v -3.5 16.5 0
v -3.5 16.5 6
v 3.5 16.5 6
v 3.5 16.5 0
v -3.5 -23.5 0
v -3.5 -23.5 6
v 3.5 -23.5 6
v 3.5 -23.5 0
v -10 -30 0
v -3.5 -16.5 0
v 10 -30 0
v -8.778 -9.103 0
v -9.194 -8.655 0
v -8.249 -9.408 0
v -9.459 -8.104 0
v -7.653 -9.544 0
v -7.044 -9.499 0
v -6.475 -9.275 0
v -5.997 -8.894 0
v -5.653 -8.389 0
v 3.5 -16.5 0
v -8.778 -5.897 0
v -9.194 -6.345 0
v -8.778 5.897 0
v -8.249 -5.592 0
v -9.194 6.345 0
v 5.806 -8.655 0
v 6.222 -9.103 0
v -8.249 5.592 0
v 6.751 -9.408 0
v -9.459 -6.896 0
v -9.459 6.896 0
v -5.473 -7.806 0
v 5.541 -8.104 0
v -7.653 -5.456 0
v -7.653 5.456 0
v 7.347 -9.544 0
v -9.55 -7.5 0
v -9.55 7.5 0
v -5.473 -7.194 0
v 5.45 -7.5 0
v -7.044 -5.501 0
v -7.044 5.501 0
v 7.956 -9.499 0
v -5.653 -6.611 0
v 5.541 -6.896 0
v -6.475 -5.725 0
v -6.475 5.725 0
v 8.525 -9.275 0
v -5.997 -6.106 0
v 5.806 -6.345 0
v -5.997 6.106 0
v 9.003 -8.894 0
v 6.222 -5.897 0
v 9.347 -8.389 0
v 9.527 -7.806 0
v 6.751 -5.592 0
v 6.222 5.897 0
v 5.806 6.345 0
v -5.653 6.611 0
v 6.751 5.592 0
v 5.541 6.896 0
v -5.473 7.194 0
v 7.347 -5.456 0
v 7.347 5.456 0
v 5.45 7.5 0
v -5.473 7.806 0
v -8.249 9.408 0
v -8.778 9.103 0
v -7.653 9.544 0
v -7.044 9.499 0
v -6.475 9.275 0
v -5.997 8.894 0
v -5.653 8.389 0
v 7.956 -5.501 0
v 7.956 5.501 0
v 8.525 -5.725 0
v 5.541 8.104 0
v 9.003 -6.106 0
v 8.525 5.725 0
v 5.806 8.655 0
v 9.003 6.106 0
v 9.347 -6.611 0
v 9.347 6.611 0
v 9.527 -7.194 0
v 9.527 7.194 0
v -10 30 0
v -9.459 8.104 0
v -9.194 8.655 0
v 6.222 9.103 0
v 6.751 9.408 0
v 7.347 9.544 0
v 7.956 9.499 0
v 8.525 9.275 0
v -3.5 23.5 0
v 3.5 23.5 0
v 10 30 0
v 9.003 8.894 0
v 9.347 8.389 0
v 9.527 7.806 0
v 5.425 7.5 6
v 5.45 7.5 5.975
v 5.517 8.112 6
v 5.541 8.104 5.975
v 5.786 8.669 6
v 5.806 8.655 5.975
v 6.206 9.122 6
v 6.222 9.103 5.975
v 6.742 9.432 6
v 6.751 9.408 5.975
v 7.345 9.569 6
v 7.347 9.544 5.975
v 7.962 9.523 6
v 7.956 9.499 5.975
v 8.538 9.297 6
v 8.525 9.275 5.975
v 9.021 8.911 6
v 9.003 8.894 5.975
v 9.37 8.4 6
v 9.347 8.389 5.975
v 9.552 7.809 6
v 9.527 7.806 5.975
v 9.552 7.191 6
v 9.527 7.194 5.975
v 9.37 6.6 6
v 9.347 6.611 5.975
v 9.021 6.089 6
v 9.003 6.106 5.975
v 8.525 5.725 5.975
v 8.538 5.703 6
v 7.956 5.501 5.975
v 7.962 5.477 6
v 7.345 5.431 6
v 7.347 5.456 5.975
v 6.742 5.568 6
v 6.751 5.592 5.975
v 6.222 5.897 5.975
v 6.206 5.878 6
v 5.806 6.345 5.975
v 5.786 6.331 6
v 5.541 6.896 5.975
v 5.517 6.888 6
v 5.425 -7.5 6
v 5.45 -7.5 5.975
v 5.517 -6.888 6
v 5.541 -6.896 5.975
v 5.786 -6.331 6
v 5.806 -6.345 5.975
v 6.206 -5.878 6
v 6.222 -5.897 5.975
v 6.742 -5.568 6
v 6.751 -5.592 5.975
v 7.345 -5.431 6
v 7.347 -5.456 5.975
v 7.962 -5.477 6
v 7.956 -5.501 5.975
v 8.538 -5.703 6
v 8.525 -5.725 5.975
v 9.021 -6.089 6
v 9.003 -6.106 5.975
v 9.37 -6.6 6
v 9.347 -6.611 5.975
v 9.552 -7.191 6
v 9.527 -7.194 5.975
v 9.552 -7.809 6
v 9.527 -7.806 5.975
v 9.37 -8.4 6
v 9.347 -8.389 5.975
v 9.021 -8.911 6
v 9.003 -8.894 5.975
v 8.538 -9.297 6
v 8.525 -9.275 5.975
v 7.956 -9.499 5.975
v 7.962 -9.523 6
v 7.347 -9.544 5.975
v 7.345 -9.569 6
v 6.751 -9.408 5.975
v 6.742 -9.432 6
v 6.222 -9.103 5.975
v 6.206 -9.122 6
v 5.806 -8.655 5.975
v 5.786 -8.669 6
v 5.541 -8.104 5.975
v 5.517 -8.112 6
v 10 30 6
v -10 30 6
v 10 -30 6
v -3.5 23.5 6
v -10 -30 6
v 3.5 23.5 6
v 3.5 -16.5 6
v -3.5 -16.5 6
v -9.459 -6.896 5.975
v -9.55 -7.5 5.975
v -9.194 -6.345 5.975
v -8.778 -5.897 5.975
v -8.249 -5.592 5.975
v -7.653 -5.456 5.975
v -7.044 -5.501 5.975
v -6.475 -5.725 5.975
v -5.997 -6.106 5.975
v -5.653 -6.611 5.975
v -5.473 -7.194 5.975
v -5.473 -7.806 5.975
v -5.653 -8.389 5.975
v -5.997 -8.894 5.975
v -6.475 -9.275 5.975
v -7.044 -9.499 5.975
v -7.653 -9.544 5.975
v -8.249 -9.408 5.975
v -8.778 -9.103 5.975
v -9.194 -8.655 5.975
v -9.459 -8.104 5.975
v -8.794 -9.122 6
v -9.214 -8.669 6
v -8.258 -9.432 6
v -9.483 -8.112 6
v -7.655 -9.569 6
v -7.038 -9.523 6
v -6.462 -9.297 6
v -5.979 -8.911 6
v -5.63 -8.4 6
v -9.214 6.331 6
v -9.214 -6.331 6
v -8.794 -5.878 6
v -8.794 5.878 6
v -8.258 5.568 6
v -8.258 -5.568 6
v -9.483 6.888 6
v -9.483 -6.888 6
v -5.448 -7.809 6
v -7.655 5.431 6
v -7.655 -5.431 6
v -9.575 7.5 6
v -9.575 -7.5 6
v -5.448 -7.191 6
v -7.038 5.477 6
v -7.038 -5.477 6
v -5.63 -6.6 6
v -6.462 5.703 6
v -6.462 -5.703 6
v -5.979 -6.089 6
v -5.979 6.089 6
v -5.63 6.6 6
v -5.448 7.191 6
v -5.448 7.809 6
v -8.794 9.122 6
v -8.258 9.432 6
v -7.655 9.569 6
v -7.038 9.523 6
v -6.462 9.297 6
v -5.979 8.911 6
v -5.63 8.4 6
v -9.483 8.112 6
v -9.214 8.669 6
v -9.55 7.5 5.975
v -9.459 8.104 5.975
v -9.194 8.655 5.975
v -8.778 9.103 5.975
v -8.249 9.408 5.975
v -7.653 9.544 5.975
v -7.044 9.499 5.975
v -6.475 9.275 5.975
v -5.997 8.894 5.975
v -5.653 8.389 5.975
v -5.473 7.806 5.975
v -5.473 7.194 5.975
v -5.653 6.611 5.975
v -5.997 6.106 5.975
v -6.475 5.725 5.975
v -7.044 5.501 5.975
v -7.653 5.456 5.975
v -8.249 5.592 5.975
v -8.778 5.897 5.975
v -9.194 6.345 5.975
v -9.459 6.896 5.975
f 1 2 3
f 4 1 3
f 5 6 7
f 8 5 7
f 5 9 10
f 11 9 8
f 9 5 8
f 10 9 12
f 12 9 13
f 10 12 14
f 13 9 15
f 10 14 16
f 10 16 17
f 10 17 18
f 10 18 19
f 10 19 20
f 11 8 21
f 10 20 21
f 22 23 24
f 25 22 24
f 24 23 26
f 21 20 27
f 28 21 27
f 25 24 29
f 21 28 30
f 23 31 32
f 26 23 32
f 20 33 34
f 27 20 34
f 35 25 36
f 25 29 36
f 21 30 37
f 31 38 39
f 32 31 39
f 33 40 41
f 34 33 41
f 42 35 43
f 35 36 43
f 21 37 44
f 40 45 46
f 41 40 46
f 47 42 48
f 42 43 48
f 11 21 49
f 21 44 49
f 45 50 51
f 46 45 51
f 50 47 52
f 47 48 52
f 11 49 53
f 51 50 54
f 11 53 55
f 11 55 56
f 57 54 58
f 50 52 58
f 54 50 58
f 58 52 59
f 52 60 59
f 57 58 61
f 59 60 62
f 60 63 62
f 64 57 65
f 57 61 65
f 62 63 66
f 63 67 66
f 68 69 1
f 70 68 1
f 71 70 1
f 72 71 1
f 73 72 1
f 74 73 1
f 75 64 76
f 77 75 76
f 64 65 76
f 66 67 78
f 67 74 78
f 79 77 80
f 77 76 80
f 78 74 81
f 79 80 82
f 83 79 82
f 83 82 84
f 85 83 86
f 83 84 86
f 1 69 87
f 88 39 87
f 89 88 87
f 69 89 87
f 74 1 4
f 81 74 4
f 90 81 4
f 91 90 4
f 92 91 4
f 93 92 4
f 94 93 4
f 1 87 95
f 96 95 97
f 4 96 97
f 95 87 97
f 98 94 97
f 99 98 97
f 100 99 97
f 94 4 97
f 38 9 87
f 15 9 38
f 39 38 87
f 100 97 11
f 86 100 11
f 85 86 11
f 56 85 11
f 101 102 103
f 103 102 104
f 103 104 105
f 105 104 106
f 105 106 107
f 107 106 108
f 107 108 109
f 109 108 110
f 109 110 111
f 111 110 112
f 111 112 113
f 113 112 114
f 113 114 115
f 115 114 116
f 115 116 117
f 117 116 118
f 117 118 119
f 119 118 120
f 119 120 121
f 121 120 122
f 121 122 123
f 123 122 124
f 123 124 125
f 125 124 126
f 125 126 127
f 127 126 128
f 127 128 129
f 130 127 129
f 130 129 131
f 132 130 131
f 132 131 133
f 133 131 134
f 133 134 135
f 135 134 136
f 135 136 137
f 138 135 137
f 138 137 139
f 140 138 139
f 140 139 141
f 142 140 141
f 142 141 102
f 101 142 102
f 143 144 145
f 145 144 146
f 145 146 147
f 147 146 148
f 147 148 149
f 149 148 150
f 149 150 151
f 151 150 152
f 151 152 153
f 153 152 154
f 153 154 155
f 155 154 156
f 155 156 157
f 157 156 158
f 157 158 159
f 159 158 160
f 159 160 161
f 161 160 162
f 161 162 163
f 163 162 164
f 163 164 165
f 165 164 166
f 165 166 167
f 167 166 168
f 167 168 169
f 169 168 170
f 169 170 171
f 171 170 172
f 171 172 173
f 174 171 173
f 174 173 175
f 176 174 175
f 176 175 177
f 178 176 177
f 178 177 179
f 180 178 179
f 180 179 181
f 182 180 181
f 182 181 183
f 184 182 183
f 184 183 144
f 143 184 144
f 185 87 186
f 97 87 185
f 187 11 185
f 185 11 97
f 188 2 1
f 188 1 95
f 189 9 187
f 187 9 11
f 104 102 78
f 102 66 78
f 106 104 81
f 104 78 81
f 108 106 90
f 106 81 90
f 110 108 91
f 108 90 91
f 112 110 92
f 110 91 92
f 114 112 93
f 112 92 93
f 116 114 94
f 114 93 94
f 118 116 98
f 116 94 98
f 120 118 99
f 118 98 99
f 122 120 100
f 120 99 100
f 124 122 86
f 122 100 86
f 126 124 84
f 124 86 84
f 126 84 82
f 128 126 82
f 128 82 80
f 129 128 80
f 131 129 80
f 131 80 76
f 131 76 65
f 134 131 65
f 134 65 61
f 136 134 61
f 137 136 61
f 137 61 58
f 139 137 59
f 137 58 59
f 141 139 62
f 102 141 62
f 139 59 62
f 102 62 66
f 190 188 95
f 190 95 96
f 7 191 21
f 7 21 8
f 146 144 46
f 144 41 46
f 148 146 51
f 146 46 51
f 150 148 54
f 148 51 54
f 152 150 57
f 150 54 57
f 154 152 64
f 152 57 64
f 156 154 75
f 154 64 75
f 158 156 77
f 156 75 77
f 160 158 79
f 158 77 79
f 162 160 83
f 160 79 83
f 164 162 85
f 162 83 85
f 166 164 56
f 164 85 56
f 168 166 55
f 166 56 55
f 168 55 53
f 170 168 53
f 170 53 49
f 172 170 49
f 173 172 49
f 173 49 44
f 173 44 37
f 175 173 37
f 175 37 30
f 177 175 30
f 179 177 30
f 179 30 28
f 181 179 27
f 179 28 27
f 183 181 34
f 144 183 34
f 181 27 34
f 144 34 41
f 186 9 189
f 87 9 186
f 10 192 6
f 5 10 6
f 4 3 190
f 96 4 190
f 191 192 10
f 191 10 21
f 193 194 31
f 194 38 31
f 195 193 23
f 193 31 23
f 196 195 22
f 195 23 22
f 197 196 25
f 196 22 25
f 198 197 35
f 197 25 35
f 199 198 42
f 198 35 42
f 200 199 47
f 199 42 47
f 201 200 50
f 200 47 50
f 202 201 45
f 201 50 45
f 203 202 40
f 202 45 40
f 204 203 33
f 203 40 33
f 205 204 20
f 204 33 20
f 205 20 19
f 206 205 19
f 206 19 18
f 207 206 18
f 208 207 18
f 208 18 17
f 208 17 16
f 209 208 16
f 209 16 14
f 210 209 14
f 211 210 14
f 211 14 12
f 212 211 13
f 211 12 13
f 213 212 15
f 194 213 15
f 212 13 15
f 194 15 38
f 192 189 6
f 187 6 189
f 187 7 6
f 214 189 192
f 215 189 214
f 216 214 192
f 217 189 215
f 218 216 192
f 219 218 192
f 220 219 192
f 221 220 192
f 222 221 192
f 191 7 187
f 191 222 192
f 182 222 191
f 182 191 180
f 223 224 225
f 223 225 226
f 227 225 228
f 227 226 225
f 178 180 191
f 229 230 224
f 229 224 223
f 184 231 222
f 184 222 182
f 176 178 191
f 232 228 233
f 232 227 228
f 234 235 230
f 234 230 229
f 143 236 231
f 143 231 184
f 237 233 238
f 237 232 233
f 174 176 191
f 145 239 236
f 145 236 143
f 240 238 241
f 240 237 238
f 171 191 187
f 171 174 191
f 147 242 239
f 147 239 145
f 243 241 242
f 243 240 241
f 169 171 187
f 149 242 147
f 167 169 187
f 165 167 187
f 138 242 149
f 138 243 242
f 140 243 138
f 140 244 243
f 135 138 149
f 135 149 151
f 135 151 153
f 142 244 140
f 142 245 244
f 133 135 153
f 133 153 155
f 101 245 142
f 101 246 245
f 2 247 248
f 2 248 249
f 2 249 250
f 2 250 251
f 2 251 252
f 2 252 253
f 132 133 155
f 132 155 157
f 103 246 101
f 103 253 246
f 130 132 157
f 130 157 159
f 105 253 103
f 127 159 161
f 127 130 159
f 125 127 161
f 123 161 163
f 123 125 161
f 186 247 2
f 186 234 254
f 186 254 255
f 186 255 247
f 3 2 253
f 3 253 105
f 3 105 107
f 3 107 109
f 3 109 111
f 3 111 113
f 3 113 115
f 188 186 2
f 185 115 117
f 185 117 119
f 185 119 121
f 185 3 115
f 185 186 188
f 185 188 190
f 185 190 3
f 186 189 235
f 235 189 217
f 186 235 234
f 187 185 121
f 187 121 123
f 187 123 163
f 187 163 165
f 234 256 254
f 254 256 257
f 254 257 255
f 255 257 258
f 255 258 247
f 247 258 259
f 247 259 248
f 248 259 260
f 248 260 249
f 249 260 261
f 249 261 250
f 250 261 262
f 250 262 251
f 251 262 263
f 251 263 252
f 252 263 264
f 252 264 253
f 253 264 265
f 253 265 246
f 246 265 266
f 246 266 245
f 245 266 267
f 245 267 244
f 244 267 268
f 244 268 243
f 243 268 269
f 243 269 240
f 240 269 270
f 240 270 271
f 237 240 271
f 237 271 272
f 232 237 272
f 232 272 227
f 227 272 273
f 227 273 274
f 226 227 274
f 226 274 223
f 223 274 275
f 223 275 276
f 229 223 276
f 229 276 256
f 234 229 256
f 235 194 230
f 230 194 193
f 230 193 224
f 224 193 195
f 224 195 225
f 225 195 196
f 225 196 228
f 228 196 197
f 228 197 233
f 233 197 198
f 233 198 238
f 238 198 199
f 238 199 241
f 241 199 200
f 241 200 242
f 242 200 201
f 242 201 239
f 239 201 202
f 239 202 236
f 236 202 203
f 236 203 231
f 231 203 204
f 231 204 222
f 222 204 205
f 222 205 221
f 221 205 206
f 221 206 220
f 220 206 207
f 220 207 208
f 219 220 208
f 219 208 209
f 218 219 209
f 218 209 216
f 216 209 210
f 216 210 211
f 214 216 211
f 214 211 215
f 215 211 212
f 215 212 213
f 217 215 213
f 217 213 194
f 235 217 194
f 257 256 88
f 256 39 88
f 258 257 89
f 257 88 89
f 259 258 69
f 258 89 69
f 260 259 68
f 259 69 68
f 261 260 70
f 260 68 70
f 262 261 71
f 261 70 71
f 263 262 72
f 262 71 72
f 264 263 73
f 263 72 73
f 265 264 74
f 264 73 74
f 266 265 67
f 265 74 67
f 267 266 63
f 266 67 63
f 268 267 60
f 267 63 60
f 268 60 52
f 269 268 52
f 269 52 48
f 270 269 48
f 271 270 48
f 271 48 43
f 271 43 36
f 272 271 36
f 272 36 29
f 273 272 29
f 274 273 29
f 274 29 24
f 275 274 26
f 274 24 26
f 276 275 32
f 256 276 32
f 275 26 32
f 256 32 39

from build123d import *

# Parameters (mm, degrees)
SKETCH_1_W                        = 20
SKETCH_1_H                        = 60
EXTRUDE_1_DEPTH                   = 6
SKETCH_2_W                        = 7
SKETCH_2_H                        = 7
CUT_EXTRUDE_1_DEPTH               = 10
HOLE_WIZARD_4_1_4_1_1_D           = 4.1
HOLE_WIZARD_4_1_4_1_1_CSINK_D     = 4.15
HOLE_WIZARD_4_1_4_1_1_CSINK_ANGLE = 90


with BuildPart() as part:
    # 草图1 → 凸台-拉伸1 (new body)
    with BuildSketch(Plane.XY):
        Rectangle(SKETCH_1_W, SKETCH_1_H)
    extrude(amount=EXTRUDE_1_DEPTH)

    # 草图2 → 切除-拉伸1 (cut)
    with BuildSketch(Plane.XY.offset(6)):
        with Locations((0, 20)):
            Rectangle(SKETCH_2_W, SKETCH_2_H)
    cut_extrude_1 = extrude(amount=-CUT_EXTRUDE_1_DEPTH, mode=Mode.SUBTRACT)

    # 镜向1: 切除-拉伸1 across plane
    add(cut_extrude_1.mirror(Plane.ZX), mode=Mode.SUBTRACT)

    # Ø4.1 (4.1) 直径孔1 (through all)
    with Locations(Plane(origin=(-7.5, 7.5, 6), x_dir=(1, 0, 0), z_dir=(0, 0, 1))):
        with Locations((0, 0), (15, 0), (15, -15), (0, -15)):
            CounterSinkHole(HOLE_WIZARD_4_1_4_1_1_D / 2, HOLE_WIZARD_4_1_4_1_1_CSINK_D / 2, counter_sink_angle=HOLE_WIZARD_4_1_4_1_1_CSINK_ANGLE)


solid = part.part
